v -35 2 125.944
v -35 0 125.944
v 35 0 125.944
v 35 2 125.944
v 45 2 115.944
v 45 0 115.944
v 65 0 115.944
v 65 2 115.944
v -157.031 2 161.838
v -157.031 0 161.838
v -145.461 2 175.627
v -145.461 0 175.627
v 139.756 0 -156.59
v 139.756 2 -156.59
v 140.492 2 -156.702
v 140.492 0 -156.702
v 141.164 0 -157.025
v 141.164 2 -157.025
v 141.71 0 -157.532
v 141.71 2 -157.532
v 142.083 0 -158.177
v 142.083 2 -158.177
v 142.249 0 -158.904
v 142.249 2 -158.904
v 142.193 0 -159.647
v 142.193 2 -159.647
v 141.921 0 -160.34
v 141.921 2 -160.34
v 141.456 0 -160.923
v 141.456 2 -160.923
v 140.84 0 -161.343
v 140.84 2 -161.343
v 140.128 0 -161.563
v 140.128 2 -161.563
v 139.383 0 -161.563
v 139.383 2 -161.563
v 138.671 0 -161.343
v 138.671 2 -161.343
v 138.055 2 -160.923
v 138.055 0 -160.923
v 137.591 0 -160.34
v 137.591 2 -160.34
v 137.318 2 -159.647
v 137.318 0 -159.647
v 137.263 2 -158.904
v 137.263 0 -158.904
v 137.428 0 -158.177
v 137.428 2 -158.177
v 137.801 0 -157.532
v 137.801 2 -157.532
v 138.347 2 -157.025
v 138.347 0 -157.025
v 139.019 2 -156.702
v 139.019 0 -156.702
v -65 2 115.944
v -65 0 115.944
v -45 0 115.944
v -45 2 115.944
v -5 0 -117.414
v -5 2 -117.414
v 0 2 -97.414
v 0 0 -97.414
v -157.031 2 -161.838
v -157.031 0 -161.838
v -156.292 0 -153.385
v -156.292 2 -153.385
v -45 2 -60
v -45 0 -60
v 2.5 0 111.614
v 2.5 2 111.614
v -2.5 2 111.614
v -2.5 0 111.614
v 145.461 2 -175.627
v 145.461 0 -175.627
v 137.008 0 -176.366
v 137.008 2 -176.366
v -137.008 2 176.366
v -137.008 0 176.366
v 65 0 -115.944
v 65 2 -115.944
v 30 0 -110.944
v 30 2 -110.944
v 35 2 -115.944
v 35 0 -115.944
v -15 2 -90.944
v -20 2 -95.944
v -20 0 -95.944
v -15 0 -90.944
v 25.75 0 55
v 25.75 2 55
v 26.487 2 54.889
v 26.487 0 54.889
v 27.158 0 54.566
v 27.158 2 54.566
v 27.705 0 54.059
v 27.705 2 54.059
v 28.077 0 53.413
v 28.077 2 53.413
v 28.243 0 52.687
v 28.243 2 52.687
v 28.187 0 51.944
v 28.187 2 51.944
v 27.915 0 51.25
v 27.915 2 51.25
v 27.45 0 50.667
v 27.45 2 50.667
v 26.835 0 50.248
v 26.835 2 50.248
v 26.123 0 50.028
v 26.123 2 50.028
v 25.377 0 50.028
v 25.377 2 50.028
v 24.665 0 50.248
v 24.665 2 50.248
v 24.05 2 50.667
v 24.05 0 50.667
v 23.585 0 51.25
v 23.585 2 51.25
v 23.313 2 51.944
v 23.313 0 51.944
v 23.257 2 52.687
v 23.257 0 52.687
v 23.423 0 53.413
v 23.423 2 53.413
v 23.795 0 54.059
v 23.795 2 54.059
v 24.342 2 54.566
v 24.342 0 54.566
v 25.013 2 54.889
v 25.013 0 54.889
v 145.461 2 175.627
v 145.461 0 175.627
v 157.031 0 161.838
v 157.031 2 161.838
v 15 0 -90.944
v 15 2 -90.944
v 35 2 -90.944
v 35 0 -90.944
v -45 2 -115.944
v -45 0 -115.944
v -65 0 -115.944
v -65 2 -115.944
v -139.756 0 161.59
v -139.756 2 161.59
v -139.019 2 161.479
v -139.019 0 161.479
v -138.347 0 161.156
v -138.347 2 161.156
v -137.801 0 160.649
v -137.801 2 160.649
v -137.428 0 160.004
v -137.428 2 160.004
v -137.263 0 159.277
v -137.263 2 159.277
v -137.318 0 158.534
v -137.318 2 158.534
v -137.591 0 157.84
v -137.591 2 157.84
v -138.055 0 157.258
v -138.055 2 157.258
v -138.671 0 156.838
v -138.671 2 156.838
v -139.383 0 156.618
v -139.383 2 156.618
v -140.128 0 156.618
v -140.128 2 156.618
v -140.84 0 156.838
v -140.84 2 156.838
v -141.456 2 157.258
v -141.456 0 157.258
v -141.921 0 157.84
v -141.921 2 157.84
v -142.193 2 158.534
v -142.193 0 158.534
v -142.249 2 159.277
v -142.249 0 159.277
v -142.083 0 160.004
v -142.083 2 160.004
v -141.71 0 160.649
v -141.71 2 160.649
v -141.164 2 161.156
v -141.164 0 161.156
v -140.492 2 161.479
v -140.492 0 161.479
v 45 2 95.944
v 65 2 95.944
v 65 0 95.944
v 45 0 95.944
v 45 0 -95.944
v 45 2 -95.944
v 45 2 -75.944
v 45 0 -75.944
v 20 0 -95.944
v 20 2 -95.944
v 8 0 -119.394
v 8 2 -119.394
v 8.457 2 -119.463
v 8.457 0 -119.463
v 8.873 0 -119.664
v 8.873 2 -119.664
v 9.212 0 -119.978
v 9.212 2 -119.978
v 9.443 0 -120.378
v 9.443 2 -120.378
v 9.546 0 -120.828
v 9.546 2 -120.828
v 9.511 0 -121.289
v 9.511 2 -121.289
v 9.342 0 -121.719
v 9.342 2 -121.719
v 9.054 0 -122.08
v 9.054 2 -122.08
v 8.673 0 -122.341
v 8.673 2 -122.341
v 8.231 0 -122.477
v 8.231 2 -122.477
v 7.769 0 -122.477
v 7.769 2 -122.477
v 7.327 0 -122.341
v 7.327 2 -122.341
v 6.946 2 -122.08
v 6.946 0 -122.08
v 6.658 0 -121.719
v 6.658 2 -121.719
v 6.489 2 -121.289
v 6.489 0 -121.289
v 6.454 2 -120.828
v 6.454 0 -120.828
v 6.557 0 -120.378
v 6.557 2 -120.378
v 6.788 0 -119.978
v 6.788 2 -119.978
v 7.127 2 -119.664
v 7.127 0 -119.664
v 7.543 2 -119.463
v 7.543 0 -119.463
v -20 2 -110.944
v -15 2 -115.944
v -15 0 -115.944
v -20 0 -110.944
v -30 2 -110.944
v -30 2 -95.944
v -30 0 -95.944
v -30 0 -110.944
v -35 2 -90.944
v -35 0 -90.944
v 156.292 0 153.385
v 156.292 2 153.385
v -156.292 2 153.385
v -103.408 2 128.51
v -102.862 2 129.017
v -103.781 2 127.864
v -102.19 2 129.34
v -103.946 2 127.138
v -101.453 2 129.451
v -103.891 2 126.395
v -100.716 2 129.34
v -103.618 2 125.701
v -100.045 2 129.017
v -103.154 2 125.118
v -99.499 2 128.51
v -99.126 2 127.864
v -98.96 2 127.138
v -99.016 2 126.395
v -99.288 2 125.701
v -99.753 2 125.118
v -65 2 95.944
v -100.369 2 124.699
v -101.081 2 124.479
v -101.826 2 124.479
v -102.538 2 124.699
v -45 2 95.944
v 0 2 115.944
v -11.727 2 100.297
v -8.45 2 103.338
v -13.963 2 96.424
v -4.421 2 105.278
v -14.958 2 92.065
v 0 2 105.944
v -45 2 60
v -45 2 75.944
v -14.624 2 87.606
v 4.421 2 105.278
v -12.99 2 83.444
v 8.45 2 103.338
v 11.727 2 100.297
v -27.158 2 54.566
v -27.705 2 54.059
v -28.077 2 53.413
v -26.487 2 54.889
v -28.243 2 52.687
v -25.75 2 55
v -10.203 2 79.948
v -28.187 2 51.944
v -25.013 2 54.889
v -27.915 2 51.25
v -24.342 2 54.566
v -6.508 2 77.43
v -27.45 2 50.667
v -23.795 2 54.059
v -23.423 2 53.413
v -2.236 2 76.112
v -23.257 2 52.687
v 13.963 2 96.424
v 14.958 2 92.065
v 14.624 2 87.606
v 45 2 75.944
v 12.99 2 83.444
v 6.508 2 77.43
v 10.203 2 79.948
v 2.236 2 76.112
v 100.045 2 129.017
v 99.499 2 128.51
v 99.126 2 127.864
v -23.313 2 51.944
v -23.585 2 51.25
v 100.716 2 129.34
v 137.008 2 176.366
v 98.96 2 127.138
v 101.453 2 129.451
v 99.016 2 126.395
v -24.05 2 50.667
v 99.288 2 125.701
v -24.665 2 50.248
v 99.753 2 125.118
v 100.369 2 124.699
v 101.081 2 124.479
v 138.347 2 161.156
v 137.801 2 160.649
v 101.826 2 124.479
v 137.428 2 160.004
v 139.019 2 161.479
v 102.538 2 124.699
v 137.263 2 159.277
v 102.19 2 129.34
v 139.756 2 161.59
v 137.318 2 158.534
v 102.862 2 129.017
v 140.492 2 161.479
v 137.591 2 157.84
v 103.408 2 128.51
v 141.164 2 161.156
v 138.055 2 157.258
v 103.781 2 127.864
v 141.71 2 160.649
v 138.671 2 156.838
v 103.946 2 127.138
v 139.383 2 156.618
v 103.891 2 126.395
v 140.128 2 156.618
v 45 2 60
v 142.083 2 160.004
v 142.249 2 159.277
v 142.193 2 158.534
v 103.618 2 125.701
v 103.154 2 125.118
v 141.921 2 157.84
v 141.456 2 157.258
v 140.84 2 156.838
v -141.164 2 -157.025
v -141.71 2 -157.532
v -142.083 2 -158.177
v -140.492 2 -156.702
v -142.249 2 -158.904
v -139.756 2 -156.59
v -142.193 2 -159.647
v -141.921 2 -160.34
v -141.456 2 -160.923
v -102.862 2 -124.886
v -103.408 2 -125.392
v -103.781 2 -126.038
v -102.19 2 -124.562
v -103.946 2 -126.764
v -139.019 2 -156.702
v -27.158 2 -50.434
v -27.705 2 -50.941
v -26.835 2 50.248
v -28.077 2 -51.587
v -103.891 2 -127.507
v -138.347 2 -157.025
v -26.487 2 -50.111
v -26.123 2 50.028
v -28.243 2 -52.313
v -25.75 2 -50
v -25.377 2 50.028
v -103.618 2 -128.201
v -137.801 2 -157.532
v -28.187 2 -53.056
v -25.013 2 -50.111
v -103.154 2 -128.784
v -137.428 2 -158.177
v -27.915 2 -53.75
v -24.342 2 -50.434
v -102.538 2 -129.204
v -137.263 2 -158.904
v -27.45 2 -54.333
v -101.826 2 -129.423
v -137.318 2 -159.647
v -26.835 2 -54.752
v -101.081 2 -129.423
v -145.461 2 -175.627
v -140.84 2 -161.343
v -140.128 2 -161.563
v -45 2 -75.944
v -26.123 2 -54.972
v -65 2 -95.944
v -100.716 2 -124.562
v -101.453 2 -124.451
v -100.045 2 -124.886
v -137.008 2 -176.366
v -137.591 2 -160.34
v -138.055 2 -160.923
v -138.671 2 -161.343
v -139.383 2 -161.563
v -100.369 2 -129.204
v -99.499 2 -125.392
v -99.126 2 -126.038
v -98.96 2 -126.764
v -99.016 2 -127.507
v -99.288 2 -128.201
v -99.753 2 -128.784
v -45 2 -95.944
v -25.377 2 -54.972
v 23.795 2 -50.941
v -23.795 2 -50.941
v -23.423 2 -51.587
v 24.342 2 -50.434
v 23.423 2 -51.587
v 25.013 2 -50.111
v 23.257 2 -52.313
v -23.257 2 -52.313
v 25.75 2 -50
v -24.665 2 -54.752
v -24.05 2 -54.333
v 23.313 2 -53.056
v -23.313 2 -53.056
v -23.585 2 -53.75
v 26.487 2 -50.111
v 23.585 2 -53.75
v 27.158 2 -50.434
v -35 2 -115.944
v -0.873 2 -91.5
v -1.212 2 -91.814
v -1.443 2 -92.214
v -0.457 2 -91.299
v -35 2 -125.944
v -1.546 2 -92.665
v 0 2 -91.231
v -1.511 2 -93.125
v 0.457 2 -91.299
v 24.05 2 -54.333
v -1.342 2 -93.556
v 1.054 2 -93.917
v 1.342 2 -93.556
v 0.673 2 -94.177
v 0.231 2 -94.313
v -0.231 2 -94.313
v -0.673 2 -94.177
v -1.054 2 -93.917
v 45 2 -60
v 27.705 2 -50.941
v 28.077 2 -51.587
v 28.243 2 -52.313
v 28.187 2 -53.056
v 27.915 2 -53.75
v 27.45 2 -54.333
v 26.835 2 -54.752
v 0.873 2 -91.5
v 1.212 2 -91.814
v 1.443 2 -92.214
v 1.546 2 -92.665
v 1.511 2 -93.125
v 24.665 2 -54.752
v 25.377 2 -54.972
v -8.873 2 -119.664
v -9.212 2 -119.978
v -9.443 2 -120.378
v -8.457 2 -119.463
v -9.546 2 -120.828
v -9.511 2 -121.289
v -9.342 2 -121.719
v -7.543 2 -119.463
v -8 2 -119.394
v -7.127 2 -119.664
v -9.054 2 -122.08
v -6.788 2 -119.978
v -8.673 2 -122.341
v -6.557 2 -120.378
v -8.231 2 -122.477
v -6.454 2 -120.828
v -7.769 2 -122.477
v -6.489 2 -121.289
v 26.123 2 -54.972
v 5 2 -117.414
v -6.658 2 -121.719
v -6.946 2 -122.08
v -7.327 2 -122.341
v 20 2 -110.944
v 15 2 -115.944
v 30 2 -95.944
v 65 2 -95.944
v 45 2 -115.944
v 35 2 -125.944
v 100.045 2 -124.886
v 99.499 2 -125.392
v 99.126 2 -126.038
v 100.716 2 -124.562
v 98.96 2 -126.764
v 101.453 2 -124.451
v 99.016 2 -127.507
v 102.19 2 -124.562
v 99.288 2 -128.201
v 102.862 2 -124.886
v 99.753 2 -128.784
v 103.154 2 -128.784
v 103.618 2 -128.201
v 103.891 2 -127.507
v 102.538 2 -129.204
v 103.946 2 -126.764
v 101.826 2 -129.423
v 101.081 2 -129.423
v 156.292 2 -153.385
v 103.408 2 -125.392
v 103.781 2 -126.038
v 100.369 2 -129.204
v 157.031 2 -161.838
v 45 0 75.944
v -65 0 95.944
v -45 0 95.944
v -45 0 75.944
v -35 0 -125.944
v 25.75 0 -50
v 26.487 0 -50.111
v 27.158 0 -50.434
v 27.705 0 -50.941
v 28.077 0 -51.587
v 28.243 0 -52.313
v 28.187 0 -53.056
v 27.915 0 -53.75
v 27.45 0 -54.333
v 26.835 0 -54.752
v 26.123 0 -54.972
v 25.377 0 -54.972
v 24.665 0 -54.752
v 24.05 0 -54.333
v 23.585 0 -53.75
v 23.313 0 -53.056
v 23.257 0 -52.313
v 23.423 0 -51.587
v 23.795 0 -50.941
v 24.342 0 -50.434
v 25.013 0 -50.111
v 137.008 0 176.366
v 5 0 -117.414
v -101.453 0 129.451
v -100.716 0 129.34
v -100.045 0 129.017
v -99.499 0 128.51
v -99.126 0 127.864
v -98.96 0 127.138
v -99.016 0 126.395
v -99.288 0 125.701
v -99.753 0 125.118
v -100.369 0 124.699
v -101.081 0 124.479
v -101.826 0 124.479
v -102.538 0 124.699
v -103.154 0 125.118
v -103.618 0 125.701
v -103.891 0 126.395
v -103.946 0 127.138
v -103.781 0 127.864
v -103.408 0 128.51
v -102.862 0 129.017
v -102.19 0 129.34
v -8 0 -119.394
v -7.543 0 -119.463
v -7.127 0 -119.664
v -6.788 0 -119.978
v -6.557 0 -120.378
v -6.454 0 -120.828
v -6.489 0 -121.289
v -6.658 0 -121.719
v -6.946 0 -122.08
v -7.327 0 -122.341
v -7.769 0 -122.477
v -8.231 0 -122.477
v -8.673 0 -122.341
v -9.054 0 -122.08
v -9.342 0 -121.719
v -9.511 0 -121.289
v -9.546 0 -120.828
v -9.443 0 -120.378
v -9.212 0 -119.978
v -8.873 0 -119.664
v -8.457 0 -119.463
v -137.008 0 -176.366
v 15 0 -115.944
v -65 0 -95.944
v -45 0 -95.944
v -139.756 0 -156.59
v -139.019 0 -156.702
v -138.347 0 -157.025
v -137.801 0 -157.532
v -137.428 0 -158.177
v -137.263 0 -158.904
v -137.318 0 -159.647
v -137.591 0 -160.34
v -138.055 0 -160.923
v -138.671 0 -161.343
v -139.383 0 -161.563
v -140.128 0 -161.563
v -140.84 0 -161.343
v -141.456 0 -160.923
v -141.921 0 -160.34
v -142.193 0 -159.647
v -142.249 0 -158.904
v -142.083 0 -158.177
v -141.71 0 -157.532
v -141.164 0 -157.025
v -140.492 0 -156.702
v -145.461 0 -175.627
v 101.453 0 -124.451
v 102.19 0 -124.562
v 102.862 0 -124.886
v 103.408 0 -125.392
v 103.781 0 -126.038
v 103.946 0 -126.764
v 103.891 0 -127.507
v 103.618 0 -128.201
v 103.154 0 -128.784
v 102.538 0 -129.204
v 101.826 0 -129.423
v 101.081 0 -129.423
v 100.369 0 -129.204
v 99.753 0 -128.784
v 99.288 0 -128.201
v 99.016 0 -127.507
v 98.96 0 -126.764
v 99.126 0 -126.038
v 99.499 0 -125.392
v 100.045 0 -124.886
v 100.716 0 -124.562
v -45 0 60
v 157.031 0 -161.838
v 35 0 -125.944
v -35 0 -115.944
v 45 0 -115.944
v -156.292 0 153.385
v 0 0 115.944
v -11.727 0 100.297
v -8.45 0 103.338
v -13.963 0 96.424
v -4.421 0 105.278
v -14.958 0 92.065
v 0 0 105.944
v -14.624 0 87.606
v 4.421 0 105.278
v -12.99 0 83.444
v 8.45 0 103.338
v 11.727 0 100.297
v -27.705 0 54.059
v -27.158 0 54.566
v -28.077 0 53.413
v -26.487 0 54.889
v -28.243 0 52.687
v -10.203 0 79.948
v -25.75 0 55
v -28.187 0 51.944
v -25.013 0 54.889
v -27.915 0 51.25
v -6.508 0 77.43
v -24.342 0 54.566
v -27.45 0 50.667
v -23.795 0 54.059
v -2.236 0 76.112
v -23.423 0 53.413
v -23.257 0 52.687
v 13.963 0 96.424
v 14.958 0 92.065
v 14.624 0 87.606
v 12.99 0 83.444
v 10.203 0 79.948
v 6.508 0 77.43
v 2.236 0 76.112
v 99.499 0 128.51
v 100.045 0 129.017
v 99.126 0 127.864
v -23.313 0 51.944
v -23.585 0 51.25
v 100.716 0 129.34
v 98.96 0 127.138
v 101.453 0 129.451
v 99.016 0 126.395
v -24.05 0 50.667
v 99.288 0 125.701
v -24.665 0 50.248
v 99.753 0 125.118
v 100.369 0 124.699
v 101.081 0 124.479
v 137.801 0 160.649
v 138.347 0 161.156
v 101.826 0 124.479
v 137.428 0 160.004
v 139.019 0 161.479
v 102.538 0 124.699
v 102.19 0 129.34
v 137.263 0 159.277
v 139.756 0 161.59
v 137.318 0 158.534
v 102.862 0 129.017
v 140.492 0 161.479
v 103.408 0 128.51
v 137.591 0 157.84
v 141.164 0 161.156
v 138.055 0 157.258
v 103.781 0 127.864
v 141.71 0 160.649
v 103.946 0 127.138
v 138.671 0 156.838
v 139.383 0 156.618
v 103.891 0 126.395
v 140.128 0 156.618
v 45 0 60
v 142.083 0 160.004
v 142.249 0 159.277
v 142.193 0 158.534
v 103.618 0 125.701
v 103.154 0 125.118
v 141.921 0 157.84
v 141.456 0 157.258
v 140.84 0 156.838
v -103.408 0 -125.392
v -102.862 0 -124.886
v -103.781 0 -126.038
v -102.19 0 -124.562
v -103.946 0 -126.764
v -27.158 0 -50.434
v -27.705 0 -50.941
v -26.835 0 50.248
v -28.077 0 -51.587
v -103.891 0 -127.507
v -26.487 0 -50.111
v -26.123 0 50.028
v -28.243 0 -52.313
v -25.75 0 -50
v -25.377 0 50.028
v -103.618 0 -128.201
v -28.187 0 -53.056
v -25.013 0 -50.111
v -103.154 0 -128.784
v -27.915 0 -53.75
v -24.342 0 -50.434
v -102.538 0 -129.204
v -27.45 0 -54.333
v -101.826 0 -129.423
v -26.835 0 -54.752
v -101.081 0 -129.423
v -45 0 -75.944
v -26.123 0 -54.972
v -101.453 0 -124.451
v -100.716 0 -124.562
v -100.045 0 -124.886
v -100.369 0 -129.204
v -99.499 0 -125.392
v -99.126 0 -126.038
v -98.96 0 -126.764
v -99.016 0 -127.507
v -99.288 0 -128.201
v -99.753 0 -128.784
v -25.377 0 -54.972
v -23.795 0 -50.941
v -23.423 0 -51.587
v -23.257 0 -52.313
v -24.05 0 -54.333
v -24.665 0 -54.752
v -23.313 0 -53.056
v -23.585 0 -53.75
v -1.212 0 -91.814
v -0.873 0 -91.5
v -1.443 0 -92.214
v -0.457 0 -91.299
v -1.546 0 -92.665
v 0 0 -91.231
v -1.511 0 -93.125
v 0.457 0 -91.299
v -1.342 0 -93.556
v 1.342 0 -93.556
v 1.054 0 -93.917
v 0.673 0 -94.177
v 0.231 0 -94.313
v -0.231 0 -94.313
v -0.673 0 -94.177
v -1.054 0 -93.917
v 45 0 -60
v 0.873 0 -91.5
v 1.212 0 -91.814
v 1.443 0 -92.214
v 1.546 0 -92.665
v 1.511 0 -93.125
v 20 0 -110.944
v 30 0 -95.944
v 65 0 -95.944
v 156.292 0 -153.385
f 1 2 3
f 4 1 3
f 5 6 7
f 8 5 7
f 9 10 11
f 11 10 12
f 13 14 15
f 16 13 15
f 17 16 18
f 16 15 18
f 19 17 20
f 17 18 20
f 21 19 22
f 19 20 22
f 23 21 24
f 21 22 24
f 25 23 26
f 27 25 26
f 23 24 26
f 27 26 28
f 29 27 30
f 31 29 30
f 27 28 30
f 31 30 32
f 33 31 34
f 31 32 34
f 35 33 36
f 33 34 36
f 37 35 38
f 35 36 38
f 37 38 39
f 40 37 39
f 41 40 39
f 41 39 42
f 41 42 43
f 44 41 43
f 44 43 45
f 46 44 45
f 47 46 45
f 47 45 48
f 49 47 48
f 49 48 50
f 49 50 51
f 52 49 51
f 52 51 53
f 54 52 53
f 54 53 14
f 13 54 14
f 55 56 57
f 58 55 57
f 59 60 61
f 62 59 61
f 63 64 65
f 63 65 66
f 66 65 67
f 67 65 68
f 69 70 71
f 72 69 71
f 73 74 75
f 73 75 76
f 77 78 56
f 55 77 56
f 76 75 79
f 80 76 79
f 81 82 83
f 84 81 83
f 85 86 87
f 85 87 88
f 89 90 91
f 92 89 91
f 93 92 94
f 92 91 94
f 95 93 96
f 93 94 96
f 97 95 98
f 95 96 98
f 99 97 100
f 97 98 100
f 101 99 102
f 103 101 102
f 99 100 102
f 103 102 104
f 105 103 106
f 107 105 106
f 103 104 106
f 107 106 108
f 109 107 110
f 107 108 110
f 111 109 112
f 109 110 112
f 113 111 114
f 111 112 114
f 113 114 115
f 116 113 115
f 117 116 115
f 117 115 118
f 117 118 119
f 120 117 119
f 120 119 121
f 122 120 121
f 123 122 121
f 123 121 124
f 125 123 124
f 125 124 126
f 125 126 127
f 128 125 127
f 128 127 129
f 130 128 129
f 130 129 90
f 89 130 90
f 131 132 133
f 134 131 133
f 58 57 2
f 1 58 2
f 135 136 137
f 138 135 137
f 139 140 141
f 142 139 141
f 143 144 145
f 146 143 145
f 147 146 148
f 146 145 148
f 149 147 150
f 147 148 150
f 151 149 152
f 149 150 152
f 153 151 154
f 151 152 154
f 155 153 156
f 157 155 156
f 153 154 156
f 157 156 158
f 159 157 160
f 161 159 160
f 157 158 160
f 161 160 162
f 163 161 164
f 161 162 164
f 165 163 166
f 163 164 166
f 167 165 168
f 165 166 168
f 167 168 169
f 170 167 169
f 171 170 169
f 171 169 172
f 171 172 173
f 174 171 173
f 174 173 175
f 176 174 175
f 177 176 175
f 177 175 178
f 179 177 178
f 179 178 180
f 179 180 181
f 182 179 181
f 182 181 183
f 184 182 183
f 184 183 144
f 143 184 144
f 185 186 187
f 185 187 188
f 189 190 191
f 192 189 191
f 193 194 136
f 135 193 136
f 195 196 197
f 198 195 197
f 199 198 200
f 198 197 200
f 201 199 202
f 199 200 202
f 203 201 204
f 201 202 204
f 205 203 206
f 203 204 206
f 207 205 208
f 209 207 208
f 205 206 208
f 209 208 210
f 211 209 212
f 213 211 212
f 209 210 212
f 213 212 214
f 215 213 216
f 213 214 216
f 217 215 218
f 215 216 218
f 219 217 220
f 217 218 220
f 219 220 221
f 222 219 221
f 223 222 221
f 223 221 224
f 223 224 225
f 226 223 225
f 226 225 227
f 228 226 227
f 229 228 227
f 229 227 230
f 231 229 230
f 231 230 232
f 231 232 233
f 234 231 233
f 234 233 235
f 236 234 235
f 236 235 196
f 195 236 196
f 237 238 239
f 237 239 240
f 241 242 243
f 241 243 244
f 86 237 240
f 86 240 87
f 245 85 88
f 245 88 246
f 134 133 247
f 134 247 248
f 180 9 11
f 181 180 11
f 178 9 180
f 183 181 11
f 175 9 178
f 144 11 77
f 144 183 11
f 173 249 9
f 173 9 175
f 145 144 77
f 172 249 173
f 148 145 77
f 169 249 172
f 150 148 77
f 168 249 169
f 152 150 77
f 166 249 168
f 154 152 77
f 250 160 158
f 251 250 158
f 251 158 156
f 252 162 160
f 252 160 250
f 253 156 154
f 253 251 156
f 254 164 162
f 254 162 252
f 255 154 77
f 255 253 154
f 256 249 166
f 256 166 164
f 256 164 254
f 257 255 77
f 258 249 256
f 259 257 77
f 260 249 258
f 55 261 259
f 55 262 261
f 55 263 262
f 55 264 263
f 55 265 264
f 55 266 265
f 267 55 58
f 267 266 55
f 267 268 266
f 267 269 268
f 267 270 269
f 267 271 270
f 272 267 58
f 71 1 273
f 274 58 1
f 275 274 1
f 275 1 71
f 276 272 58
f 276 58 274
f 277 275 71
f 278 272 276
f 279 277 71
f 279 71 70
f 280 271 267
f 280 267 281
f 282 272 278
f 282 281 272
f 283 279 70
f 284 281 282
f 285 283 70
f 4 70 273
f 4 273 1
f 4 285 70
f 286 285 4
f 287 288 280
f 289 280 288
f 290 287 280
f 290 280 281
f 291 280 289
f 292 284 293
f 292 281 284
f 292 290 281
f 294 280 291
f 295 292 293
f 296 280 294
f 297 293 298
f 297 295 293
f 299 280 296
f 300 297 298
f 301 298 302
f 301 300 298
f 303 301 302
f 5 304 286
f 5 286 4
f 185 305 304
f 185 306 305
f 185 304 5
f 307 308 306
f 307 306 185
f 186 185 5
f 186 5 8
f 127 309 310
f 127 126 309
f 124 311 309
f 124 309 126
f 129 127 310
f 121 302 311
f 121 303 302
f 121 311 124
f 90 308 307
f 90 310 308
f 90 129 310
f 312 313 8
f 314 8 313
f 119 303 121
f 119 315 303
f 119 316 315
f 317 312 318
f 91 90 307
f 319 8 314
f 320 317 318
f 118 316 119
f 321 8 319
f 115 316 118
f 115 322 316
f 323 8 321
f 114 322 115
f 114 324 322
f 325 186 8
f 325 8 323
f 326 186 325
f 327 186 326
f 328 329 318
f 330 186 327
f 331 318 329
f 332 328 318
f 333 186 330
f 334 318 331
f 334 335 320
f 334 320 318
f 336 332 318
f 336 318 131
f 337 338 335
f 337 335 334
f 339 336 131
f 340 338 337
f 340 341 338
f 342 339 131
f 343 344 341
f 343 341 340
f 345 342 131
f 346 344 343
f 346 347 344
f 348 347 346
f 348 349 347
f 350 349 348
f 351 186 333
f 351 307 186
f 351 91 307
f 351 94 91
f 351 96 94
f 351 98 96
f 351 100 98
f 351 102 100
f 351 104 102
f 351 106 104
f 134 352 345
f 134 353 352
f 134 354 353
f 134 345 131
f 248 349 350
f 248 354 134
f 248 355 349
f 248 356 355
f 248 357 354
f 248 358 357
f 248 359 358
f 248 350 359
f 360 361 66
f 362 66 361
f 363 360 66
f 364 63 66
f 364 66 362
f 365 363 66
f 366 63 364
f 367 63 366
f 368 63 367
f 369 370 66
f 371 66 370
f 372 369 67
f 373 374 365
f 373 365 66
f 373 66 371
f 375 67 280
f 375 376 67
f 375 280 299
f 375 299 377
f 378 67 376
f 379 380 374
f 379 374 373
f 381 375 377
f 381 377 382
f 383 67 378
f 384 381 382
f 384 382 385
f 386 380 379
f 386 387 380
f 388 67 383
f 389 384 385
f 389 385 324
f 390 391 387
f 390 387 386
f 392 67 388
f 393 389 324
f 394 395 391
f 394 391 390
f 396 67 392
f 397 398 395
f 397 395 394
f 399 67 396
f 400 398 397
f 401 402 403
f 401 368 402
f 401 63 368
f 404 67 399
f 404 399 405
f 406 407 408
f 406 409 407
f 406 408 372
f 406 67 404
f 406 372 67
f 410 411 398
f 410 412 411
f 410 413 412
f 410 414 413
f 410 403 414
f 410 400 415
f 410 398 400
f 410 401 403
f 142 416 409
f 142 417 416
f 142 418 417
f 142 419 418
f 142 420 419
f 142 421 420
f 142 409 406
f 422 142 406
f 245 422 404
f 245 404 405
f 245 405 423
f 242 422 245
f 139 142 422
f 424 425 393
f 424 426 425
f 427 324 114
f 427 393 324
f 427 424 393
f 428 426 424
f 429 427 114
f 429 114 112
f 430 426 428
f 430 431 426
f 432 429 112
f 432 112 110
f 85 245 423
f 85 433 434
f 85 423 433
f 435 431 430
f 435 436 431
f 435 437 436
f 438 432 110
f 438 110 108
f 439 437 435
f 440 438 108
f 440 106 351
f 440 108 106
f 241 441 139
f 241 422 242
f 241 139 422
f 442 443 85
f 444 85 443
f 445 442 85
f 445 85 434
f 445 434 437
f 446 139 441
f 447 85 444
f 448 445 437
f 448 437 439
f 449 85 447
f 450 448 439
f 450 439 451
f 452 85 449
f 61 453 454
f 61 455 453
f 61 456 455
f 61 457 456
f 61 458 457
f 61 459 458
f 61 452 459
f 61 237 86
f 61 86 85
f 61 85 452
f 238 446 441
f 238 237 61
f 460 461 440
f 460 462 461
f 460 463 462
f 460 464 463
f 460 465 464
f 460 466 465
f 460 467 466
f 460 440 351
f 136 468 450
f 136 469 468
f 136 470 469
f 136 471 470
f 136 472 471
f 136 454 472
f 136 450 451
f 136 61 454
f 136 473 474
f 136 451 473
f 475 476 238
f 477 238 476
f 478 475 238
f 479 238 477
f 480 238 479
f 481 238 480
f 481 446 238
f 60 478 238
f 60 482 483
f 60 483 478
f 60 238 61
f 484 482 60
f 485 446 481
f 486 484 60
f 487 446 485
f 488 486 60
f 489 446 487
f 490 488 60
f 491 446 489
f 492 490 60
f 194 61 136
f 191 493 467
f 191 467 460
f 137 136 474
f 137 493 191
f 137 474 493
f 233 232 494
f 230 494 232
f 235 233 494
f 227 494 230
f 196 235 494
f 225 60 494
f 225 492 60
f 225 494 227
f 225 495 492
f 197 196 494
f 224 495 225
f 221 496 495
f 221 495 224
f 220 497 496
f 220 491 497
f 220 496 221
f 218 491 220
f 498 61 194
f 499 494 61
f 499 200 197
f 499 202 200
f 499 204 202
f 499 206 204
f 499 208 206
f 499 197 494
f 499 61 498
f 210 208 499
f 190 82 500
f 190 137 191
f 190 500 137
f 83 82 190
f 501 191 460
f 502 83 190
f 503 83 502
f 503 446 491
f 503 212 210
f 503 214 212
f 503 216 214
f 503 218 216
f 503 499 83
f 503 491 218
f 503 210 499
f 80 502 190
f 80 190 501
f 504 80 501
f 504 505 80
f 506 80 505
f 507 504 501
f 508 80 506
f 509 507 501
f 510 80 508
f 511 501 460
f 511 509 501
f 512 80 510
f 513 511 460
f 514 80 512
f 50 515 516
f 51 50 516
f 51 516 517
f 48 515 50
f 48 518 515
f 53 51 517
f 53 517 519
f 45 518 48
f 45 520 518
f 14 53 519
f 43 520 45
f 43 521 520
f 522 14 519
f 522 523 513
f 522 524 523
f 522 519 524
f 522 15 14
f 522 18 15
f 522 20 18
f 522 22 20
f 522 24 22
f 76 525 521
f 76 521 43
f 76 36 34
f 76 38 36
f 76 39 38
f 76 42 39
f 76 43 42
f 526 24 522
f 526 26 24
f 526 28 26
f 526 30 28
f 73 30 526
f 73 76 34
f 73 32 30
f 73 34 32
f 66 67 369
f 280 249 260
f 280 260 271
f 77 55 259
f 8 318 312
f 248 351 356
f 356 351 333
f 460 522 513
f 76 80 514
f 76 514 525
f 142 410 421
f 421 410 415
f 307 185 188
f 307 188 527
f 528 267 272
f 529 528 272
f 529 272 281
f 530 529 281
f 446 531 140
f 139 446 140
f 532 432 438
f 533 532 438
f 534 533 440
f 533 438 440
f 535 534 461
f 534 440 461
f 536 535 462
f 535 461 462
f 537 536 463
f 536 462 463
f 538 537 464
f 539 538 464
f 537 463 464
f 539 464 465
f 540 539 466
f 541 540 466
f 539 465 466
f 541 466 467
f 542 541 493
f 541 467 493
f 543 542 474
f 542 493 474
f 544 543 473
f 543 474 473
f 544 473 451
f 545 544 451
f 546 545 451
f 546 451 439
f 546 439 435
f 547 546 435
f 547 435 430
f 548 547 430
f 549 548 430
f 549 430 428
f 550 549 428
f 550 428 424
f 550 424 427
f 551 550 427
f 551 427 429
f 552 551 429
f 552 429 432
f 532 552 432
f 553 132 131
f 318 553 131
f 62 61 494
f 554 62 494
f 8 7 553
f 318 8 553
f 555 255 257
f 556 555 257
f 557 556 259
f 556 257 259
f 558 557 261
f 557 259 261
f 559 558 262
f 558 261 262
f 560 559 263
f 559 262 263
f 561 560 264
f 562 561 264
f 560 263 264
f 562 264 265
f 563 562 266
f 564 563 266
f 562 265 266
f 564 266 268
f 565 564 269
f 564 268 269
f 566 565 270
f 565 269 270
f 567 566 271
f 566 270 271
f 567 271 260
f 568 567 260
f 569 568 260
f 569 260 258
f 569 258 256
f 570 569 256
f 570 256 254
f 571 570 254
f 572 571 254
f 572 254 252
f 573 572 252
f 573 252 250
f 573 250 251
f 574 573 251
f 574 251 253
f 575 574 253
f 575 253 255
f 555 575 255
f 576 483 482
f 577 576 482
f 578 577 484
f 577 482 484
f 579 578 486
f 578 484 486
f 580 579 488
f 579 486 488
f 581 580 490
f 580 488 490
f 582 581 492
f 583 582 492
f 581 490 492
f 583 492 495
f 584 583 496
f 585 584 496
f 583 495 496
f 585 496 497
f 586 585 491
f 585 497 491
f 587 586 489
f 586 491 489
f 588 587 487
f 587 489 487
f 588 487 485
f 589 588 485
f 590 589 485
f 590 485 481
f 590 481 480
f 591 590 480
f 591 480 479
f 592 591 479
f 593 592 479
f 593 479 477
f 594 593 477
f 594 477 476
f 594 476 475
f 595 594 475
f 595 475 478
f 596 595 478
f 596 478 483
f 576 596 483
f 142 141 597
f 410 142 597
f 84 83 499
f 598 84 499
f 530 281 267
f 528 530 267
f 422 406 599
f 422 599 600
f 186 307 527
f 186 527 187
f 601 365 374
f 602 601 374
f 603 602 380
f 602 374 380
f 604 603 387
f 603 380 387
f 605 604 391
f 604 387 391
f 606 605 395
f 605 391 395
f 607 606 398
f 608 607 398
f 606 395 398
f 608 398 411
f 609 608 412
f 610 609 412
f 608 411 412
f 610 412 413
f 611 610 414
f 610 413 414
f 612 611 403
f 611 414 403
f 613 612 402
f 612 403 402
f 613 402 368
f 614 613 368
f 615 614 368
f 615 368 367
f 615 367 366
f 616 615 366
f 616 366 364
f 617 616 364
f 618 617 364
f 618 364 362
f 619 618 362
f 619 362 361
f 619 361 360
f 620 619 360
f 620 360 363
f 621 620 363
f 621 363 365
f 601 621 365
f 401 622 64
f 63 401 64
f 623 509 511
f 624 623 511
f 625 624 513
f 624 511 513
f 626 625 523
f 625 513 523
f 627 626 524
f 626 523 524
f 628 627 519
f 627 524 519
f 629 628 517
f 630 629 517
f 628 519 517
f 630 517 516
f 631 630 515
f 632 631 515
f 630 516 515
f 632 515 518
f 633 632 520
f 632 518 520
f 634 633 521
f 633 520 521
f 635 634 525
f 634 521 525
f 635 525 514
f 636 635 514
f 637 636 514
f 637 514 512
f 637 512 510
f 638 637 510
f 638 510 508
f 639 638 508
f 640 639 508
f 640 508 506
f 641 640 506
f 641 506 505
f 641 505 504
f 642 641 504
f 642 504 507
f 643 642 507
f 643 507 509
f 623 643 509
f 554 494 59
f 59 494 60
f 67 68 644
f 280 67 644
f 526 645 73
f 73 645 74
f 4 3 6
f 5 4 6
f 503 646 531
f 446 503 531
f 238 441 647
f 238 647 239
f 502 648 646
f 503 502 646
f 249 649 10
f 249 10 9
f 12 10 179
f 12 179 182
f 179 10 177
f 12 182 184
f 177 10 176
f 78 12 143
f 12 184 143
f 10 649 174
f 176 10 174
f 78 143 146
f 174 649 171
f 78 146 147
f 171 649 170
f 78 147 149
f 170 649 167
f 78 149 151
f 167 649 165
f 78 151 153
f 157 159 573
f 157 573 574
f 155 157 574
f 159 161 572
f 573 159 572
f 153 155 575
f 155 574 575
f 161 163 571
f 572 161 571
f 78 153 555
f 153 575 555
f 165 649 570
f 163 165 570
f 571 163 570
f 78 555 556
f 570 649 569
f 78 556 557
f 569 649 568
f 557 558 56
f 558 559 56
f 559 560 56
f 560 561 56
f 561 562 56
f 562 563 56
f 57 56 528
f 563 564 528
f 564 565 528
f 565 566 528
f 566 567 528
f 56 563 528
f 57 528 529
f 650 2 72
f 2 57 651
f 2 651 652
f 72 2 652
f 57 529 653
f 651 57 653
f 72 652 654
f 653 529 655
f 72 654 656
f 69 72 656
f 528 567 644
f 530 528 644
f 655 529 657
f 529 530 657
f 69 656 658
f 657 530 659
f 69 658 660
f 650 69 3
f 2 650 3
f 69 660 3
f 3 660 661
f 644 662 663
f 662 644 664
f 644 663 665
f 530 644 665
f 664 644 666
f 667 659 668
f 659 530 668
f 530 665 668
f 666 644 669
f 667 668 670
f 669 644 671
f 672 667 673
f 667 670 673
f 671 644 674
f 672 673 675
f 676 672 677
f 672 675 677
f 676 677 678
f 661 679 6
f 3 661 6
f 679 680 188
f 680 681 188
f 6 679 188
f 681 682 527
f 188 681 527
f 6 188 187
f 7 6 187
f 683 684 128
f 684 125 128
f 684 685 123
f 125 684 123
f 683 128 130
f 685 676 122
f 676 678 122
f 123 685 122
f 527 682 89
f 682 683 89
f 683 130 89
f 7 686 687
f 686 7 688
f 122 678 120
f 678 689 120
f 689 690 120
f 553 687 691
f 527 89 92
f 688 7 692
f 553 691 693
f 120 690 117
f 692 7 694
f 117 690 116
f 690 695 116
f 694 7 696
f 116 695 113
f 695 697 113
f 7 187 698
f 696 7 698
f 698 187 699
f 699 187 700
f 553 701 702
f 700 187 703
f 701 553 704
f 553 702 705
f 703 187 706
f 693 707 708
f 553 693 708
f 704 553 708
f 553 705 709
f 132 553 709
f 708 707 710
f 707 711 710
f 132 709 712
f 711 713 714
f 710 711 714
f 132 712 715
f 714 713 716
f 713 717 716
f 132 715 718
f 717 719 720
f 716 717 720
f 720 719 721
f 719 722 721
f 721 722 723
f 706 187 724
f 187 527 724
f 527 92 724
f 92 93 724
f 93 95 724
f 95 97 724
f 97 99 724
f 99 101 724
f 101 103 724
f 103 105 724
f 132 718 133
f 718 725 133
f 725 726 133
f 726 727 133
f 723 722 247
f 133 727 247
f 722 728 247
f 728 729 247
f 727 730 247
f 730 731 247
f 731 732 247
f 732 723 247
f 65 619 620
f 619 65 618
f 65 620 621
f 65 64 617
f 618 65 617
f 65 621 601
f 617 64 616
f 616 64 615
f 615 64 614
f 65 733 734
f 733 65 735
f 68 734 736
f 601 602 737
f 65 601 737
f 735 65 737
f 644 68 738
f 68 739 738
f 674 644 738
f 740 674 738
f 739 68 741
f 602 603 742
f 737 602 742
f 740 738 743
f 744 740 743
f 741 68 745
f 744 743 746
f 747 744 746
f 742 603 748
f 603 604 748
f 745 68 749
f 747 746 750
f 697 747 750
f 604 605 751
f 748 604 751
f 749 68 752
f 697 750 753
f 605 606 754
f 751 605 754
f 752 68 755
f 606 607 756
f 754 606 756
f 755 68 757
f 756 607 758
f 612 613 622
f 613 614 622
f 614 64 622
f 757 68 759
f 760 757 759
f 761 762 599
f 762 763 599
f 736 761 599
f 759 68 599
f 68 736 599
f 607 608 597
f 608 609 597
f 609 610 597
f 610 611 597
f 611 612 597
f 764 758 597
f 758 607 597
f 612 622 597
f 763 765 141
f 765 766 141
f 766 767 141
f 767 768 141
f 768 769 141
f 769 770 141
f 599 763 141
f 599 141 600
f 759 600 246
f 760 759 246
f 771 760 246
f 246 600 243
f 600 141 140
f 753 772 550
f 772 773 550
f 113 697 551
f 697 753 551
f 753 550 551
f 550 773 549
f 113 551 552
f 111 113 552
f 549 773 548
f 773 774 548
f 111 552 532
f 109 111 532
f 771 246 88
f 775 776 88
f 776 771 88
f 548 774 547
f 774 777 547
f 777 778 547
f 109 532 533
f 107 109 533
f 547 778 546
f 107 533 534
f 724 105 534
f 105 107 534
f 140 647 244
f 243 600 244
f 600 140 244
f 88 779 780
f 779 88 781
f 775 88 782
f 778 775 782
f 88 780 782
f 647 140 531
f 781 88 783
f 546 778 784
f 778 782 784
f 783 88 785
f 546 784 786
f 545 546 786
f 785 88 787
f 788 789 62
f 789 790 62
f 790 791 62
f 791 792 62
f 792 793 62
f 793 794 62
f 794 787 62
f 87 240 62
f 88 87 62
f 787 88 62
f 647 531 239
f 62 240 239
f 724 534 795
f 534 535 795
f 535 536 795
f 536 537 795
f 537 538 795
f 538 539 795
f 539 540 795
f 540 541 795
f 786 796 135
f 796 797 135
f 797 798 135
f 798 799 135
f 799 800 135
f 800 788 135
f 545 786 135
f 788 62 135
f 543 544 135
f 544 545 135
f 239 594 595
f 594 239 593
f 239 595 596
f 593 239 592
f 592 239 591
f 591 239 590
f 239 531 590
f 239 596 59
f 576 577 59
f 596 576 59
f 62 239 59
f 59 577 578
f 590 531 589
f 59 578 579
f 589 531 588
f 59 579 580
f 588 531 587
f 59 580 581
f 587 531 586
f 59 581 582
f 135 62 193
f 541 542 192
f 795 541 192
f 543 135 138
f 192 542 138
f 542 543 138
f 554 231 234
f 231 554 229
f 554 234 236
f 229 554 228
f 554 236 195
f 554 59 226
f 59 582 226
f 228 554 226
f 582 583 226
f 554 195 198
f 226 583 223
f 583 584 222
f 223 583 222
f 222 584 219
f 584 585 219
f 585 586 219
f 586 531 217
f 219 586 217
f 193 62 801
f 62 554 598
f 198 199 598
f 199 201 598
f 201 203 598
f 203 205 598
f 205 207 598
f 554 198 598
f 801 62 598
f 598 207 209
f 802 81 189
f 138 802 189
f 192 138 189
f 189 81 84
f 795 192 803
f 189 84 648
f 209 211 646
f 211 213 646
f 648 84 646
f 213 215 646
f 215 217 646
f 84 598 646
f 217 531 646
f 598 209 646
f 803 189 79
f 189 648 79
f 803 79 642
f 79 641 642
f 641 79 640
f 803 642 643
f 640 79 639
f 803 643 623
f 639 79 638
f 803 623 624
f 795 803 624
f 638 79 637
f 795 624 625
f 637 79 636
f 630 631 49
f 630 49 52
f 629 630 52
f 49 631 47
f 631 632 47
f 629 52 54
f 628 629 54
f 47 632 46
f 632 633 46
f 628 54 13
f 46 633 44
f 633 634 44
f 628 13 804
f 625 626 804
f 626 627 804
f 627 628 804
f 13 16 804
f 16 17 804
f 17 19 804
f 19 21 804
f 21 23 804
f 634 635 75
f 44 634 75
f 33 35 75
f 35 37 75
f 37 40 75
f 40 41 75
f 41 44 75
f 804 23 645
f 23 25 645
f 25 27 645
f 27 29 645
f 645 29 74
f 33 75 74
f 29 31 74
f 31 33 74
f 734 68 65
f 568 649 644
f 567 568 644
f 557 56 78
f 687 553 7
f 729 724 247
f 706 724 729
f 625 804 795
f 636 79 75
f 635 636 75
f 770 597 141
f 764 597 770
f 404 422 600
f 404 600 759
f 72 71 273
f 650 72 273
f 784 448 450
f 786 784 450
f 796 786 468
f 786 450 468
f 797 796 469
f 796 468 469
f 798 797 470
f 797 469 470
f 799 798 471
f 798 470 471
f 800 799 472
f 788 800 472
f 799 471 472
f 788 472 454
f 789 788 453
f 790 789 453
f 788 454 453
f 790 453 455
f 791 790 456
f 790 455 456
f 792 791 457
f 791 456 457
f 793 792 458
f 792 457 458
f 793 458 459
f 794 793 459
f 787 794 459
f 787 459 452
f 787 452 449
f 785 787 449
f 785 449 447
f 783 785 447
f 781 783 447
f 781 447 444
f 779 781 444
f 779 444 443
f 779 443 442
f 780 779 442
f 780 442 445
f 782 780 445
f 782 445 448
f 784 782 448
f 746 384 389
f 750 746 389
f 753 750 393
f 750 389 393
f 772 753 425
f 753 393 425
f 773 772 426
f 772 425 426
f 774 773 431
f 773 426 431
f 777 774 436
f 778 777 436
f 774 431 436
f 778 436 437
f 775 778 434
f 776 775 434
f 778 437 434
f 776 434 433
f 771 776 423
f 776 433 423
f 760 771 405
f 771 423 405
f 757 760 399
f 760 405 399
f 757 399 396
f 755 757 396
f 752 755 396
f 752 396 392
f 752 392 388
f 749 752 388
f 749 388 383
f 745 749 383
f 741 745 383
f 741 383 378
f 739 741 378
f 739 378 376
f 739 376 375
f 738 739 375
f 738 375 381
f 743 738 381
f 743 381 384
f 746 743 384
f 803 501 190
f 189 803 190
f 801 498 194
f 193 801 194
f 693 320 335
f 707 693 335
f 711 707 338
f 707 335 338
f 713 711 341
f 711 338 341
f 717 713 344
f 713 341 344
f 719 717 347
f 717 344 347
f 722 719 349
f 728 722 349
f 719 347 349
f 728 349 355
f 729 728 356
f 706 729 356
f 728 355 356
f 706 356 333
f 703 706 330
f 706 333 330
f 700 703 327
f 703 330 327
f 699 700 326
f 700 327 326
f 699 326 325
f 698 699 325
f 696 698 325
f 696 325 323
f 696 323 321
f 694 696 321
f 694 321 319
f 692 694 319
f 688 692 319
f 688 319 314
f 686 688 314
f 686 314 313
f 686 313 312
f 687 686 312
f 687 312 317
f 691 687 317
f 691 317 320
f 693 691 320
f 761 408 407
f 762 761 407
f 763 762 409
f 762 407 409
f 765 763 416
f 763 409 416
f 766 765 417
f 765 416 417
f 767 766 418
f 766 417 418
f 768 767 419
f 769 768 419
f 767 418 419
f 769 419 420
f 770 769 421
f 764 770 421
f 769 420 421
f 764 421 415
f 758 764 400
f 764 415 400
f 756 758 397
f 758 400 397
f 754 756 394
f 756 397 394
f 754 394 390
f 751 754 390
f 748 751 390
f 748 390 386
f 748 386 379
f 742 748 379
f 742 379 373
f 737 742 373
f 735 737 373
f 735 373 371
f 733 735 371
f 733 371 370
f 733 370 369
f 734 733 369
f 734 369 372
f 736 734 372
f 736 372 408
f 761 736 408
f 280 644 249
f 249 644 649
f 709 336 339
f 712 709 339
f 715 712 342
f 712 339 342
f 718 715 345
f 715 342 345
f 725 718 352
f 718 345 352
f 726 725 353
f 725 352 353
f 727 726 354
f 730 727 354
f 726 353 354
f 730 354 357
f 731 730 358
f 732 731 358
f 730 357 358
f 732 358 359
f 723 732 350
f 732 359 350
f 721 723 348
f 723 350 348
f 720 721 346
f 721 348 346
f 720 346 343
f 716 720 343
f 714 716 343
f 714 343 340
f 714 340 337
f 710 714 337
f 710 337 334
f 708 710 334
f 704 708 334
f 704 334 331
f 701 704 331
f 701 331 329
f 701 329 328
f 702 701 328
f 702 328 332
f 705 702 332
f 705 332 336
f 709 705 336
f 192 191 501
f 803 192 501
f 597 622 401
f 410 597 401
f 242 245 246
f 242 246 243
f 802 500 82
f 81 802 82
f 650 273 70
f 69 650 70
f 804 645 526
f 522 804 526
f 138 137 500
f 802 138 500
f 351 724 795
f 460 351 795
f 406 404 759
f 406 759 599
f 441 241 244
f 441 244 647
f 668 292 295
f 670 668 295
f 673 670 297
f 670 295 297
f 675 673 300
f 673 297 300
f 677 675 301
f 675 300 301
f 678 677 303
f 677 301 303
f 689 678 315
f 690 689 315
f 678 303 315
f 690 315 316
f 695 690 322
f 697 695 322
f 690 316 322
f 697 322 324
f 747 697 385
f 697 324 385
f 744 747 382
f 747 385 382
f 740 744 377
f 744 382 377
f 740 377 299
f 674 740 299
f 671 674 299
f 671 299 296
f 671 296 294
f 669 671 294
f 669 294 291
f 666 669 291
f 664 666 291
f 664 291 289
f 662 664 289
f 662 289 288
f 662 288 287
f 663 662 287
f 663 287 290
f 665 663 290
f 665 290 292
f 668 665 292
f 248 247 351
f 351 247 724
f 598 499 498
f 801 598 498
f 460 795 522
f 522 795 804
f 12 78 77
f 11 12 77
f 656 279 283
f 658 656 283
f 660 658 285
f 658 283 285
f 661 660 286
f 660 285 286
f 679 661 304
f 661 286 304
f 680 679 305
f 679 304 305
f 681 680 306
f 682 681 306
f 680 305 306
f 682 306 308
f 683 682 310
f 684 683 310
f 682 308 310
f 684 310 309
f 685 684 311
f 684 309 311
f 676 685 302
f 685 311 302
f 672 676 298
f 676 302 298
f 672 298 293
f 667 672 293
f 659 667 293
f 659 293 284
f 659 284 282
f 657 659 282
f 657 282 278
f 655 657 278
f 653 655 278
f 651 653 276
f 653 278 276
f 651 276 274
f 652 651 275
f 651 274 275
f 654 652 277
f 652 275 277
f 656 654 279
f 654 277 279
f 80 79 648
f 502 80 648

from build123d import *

# Parameters (mm, degrees)
Y_KSEKLIK_EKSTR_ZYON2_DEPTH = 2
KES_EKSTR_ZYON2_DEPTH       = 2
KES_EKSTR_ZYON3_DEPTH       = 20
PAH1_SIZE                   = 6
IZIM6_R                     = 2.5
KES_EKSTR_ZYON4_DEPTH       = 20
IZIM7_R                     = 1.55
KES_EKSTR_ZYON5_DEPTH       = 10
IZIM8_R                     = 15
KES_EKSTR_ZYON6_DEPTH       = 2
KES_EKSTR_ZYON7_DEPTH       = 10
KES_EKSTR_ZYON8_DEPTH       = 10
IZIM11_R                    = 2.5
KES_EKSTR_ZYON9_DEPTH       = 10


with BuildPart() as part:
    # Çizim2 → Yükseklik-Ekstrüzyon2 (new body)
    with BuildSketch(Plane(origin=(0, 0, 0), x_dir=(1, 0, 0), z_dir=(0, 1, 0))):
        Polygon((-160.888072602, 157.241638979), (-45, 60), (-45, -60), (-160.888072602, -157.241638979), (-141.604444312, -180.222972272), (-65, -115.944211304), (-45, -115.944211304), (-35, -125.944211304), (35, -125.944211304), (45, -115.944211304), (65, -115.944211304), (141.604444312, -180.222972272), (160.888072602, -157.241638979), (45, -60), (45, 60), (160.888072602, 157.241638979), (141.604444312, 180.222972272), (65, 115.944211304), (45, 115.944211304), (35, 125.944211304), (-35, 125.944211304), (-45, 115.944211304), (-65, 115.944211304), (-141.604444312, 180.222972272), align=None)
    extrude(amount=Y_KSEKLIK_EKSTR_ZYON2_DEPTH)

    # Çizim4 → Kes-Ekstrüzyon2 (cut)
    with BuildSketch(Plane(origin=(0, 2, 0), x_dir=(1, 0, 0), z_dir=(0, 1, 0))):
        Polygon((-2.5, -111.614084285), (0, -115.944211304), (2.5, -111.614084285), align=None)
    extrude(amount=-KES_EKSTR_ZYON2_DEPTH, mode=Mode.SUBTRACT)

    # Çizim5 → Kes-Ekstrüzyon3 (cut)
    with BuildSketch(Plane(origin=(0, 2, 0), x_dir=(1, 0, 0), z_dir=(0, 1, 0))):
        Polygon((-65, 95.944211304), (-45, 95.944211304), (-45, 75.944211304), align=None)
        Polygon((45, 75.944211304), (65, 95.944211304), (45, 95.944211304), align=None)
        Polygon((65, -95.944211304), (45, -95.944211304), (45, -75.944211304), align=None)
        Polygon((-45, -75.944211304), (-65, -95.944211304), (-45, -95.944211304), align=None)
    extrude(amount=-KES_EKSTR_ZYON3_DEPTH, mode=Mode.SUBTRACT)

    # Pah1
    pah1_edges = [part.edges().sort_by_distance(p)[0] for p in [
        (-160.888072602, 1, -157.241638979),
        (-141.604444312, 1, -180.222972272),
        (141.604444312, 1, -180.222972272),
        (160.888072602, 1, -157.241638979),
        (160.888072602, 1, 157.241638979),
        (141.604444312, 1, 180.222972272),
        (-141.604444312, 1, 180.222972272),
        (-160.888072602, 1, 157.241638979),
    ]]
    chamfer(pah1_edges, length=PAH1_SIZE)

    # Çizim6 → Kes-Ekstrüzyon4 (cut)
    with BuildSketch(Plane(origin=(0, 2, 0), x_dir=(1, 0, 0), z_dir=(0, 1, 0))):
        with Locations(Location((-139.75559181, 159.09049148, 0), (0, 0, 270))):
            Circle(IZIM6_R)
        with Locations(Location((-101.453369654, 126.951110996, 0), (0, 0, 270))):
            Circle(IZIM6_R)
        with Locations(Location((101.453369654, 126.951110996, 0), (0, 0, 270))):
            Circle(IZIM6_R)
        with Locations(Location((139.75559181, 159.09049148, 0), (0, 0, 270))):
            Circle(IZIM6_R)
        with Locations(Location((101.453369654, -126.951110996, 0), (0, 0, 270))):
            Circle(IZIM6_R)
        with Locations(Location((139.75559181, -159.09049148, 0), (0, 0, 270))):
            Circle(IZIM6_R)
        with Locations(Location((-101.453369654, -126.951110996, 0), (0, 0, 270))):
            Circle(IZIM6_R)
        with Locations(Location((-139.75559181, -159.09049148, 0), (0, 0, 270))):
            Circle(IZIM6_R)
    extrude(amount=-KES_EKSTR_ZYON4_DEPTH, mode=Mode.SUBTRACT)

    # Çizim7 → Kes-Ekstrüzyon5 (cut)
    with BuildSketch(Plane(origin=(0, 2, 0), x_dir=(1, 0, 0), z_dir=(0, 1, 0))):
        with Locations(Location((-8, 120.944211304, 0), (0, 0, 270))):
            Circle(IZIM7_R)
        with Locations(Location((8, 120.944211304, 0), (0, 0, 270))):
            Circle(IZIM7_R)
        with Locations(Location((0, 92.780546714, 0), (0, 0, 270))):
            Circle(IZIM7_R)
    extrude(amount=-KES_EKSTR_ZYON5_DEPTH, mode=Mode.SUBTRACT)

    # Çizim8 → Kes-Ekstrüzyon6 (cut)
    with BuildSketch(Plane(origin=(0, 2, 0), x_dir=(1, 0, 0), z_dir=(0, 1, 0))):
        with Locations(Location((0, -90.944211304, 0), (0, 0, 270))):
            Circle(IZIM8_R)
    extrude(amount=-KES_EKSTR_ZYON6_DEPTH, mode=Mode.SUBTRACT)

    # Çizim9 → Kes-Ekstrüzyon7 (cut)
    with BuildSketch(Plane(origin=(0, 2, 0), x_dir=(1, 0, 0), z_dir=(0, 1, 0))):
        Polygon((-35, 115.944211304), (-15, 115.944211304), (-20, 110.944211304), (-20, 95.944211304), (-15, 90.944211304), (-35, 90.944211304), (-30, 95.944211304), (-30, 110.944211304), align=None)
        Polygon((30, 110.944211304), (35, 115.944211304), (15, 115.944211304), (20, 110.944211304), (20, 95.944211304), (15, 90.944211304), (35, 90.944211304), (30, 95.944211304), align=None)
    extrude(amount=-KES_EKSTR_ZYON7_DEPTH, mode=Mode.SUBTRACT)

    # Çizim10 → Kes-Ekstrüzyon8 (cut)
    with BuildSketch(Plane(origin=(0, 2, 0), x_dir=(1, 0, 0), z_dir=(0, 1, 0))):
        Polygon((-5, 117.413602047), (0, 97.413602047), (5, 117.413602047), align=None)
    extrude(amount=-KES_EKSTR_ZYON8_DEPTH, mode=Mode.SUBTRACT)

    # Çizim11 → Kes-Ekstrüzyon9 (cut)
    with BuildSketch(Plane(origin=(0, 2, 0), x_dir=(1, 0, 0), z_dir=(0, 1, 0))):
        with Locations(Location((25.75, -52.5, 0), (0, 0, 270))):
            Circle(IZIM11_R)
        with Locations(Location((-25.75, -52.5, 0), (0, 0, 270))):
            Circle(IZIM11_R)
        with Locations(Location((-25.75, 52.5, 0), (0, 0, 270))):
            Circle(IZIM11_R)
        with Locations(Location((25.75, 52.5, 0), (0, 0, 270))):
            Circle(IZIM11_R)
    extrude(amount=-KES_EKSTR_ZYON9_DEPTH, mode=Mode.SUBTRACT)


solid = part.part
